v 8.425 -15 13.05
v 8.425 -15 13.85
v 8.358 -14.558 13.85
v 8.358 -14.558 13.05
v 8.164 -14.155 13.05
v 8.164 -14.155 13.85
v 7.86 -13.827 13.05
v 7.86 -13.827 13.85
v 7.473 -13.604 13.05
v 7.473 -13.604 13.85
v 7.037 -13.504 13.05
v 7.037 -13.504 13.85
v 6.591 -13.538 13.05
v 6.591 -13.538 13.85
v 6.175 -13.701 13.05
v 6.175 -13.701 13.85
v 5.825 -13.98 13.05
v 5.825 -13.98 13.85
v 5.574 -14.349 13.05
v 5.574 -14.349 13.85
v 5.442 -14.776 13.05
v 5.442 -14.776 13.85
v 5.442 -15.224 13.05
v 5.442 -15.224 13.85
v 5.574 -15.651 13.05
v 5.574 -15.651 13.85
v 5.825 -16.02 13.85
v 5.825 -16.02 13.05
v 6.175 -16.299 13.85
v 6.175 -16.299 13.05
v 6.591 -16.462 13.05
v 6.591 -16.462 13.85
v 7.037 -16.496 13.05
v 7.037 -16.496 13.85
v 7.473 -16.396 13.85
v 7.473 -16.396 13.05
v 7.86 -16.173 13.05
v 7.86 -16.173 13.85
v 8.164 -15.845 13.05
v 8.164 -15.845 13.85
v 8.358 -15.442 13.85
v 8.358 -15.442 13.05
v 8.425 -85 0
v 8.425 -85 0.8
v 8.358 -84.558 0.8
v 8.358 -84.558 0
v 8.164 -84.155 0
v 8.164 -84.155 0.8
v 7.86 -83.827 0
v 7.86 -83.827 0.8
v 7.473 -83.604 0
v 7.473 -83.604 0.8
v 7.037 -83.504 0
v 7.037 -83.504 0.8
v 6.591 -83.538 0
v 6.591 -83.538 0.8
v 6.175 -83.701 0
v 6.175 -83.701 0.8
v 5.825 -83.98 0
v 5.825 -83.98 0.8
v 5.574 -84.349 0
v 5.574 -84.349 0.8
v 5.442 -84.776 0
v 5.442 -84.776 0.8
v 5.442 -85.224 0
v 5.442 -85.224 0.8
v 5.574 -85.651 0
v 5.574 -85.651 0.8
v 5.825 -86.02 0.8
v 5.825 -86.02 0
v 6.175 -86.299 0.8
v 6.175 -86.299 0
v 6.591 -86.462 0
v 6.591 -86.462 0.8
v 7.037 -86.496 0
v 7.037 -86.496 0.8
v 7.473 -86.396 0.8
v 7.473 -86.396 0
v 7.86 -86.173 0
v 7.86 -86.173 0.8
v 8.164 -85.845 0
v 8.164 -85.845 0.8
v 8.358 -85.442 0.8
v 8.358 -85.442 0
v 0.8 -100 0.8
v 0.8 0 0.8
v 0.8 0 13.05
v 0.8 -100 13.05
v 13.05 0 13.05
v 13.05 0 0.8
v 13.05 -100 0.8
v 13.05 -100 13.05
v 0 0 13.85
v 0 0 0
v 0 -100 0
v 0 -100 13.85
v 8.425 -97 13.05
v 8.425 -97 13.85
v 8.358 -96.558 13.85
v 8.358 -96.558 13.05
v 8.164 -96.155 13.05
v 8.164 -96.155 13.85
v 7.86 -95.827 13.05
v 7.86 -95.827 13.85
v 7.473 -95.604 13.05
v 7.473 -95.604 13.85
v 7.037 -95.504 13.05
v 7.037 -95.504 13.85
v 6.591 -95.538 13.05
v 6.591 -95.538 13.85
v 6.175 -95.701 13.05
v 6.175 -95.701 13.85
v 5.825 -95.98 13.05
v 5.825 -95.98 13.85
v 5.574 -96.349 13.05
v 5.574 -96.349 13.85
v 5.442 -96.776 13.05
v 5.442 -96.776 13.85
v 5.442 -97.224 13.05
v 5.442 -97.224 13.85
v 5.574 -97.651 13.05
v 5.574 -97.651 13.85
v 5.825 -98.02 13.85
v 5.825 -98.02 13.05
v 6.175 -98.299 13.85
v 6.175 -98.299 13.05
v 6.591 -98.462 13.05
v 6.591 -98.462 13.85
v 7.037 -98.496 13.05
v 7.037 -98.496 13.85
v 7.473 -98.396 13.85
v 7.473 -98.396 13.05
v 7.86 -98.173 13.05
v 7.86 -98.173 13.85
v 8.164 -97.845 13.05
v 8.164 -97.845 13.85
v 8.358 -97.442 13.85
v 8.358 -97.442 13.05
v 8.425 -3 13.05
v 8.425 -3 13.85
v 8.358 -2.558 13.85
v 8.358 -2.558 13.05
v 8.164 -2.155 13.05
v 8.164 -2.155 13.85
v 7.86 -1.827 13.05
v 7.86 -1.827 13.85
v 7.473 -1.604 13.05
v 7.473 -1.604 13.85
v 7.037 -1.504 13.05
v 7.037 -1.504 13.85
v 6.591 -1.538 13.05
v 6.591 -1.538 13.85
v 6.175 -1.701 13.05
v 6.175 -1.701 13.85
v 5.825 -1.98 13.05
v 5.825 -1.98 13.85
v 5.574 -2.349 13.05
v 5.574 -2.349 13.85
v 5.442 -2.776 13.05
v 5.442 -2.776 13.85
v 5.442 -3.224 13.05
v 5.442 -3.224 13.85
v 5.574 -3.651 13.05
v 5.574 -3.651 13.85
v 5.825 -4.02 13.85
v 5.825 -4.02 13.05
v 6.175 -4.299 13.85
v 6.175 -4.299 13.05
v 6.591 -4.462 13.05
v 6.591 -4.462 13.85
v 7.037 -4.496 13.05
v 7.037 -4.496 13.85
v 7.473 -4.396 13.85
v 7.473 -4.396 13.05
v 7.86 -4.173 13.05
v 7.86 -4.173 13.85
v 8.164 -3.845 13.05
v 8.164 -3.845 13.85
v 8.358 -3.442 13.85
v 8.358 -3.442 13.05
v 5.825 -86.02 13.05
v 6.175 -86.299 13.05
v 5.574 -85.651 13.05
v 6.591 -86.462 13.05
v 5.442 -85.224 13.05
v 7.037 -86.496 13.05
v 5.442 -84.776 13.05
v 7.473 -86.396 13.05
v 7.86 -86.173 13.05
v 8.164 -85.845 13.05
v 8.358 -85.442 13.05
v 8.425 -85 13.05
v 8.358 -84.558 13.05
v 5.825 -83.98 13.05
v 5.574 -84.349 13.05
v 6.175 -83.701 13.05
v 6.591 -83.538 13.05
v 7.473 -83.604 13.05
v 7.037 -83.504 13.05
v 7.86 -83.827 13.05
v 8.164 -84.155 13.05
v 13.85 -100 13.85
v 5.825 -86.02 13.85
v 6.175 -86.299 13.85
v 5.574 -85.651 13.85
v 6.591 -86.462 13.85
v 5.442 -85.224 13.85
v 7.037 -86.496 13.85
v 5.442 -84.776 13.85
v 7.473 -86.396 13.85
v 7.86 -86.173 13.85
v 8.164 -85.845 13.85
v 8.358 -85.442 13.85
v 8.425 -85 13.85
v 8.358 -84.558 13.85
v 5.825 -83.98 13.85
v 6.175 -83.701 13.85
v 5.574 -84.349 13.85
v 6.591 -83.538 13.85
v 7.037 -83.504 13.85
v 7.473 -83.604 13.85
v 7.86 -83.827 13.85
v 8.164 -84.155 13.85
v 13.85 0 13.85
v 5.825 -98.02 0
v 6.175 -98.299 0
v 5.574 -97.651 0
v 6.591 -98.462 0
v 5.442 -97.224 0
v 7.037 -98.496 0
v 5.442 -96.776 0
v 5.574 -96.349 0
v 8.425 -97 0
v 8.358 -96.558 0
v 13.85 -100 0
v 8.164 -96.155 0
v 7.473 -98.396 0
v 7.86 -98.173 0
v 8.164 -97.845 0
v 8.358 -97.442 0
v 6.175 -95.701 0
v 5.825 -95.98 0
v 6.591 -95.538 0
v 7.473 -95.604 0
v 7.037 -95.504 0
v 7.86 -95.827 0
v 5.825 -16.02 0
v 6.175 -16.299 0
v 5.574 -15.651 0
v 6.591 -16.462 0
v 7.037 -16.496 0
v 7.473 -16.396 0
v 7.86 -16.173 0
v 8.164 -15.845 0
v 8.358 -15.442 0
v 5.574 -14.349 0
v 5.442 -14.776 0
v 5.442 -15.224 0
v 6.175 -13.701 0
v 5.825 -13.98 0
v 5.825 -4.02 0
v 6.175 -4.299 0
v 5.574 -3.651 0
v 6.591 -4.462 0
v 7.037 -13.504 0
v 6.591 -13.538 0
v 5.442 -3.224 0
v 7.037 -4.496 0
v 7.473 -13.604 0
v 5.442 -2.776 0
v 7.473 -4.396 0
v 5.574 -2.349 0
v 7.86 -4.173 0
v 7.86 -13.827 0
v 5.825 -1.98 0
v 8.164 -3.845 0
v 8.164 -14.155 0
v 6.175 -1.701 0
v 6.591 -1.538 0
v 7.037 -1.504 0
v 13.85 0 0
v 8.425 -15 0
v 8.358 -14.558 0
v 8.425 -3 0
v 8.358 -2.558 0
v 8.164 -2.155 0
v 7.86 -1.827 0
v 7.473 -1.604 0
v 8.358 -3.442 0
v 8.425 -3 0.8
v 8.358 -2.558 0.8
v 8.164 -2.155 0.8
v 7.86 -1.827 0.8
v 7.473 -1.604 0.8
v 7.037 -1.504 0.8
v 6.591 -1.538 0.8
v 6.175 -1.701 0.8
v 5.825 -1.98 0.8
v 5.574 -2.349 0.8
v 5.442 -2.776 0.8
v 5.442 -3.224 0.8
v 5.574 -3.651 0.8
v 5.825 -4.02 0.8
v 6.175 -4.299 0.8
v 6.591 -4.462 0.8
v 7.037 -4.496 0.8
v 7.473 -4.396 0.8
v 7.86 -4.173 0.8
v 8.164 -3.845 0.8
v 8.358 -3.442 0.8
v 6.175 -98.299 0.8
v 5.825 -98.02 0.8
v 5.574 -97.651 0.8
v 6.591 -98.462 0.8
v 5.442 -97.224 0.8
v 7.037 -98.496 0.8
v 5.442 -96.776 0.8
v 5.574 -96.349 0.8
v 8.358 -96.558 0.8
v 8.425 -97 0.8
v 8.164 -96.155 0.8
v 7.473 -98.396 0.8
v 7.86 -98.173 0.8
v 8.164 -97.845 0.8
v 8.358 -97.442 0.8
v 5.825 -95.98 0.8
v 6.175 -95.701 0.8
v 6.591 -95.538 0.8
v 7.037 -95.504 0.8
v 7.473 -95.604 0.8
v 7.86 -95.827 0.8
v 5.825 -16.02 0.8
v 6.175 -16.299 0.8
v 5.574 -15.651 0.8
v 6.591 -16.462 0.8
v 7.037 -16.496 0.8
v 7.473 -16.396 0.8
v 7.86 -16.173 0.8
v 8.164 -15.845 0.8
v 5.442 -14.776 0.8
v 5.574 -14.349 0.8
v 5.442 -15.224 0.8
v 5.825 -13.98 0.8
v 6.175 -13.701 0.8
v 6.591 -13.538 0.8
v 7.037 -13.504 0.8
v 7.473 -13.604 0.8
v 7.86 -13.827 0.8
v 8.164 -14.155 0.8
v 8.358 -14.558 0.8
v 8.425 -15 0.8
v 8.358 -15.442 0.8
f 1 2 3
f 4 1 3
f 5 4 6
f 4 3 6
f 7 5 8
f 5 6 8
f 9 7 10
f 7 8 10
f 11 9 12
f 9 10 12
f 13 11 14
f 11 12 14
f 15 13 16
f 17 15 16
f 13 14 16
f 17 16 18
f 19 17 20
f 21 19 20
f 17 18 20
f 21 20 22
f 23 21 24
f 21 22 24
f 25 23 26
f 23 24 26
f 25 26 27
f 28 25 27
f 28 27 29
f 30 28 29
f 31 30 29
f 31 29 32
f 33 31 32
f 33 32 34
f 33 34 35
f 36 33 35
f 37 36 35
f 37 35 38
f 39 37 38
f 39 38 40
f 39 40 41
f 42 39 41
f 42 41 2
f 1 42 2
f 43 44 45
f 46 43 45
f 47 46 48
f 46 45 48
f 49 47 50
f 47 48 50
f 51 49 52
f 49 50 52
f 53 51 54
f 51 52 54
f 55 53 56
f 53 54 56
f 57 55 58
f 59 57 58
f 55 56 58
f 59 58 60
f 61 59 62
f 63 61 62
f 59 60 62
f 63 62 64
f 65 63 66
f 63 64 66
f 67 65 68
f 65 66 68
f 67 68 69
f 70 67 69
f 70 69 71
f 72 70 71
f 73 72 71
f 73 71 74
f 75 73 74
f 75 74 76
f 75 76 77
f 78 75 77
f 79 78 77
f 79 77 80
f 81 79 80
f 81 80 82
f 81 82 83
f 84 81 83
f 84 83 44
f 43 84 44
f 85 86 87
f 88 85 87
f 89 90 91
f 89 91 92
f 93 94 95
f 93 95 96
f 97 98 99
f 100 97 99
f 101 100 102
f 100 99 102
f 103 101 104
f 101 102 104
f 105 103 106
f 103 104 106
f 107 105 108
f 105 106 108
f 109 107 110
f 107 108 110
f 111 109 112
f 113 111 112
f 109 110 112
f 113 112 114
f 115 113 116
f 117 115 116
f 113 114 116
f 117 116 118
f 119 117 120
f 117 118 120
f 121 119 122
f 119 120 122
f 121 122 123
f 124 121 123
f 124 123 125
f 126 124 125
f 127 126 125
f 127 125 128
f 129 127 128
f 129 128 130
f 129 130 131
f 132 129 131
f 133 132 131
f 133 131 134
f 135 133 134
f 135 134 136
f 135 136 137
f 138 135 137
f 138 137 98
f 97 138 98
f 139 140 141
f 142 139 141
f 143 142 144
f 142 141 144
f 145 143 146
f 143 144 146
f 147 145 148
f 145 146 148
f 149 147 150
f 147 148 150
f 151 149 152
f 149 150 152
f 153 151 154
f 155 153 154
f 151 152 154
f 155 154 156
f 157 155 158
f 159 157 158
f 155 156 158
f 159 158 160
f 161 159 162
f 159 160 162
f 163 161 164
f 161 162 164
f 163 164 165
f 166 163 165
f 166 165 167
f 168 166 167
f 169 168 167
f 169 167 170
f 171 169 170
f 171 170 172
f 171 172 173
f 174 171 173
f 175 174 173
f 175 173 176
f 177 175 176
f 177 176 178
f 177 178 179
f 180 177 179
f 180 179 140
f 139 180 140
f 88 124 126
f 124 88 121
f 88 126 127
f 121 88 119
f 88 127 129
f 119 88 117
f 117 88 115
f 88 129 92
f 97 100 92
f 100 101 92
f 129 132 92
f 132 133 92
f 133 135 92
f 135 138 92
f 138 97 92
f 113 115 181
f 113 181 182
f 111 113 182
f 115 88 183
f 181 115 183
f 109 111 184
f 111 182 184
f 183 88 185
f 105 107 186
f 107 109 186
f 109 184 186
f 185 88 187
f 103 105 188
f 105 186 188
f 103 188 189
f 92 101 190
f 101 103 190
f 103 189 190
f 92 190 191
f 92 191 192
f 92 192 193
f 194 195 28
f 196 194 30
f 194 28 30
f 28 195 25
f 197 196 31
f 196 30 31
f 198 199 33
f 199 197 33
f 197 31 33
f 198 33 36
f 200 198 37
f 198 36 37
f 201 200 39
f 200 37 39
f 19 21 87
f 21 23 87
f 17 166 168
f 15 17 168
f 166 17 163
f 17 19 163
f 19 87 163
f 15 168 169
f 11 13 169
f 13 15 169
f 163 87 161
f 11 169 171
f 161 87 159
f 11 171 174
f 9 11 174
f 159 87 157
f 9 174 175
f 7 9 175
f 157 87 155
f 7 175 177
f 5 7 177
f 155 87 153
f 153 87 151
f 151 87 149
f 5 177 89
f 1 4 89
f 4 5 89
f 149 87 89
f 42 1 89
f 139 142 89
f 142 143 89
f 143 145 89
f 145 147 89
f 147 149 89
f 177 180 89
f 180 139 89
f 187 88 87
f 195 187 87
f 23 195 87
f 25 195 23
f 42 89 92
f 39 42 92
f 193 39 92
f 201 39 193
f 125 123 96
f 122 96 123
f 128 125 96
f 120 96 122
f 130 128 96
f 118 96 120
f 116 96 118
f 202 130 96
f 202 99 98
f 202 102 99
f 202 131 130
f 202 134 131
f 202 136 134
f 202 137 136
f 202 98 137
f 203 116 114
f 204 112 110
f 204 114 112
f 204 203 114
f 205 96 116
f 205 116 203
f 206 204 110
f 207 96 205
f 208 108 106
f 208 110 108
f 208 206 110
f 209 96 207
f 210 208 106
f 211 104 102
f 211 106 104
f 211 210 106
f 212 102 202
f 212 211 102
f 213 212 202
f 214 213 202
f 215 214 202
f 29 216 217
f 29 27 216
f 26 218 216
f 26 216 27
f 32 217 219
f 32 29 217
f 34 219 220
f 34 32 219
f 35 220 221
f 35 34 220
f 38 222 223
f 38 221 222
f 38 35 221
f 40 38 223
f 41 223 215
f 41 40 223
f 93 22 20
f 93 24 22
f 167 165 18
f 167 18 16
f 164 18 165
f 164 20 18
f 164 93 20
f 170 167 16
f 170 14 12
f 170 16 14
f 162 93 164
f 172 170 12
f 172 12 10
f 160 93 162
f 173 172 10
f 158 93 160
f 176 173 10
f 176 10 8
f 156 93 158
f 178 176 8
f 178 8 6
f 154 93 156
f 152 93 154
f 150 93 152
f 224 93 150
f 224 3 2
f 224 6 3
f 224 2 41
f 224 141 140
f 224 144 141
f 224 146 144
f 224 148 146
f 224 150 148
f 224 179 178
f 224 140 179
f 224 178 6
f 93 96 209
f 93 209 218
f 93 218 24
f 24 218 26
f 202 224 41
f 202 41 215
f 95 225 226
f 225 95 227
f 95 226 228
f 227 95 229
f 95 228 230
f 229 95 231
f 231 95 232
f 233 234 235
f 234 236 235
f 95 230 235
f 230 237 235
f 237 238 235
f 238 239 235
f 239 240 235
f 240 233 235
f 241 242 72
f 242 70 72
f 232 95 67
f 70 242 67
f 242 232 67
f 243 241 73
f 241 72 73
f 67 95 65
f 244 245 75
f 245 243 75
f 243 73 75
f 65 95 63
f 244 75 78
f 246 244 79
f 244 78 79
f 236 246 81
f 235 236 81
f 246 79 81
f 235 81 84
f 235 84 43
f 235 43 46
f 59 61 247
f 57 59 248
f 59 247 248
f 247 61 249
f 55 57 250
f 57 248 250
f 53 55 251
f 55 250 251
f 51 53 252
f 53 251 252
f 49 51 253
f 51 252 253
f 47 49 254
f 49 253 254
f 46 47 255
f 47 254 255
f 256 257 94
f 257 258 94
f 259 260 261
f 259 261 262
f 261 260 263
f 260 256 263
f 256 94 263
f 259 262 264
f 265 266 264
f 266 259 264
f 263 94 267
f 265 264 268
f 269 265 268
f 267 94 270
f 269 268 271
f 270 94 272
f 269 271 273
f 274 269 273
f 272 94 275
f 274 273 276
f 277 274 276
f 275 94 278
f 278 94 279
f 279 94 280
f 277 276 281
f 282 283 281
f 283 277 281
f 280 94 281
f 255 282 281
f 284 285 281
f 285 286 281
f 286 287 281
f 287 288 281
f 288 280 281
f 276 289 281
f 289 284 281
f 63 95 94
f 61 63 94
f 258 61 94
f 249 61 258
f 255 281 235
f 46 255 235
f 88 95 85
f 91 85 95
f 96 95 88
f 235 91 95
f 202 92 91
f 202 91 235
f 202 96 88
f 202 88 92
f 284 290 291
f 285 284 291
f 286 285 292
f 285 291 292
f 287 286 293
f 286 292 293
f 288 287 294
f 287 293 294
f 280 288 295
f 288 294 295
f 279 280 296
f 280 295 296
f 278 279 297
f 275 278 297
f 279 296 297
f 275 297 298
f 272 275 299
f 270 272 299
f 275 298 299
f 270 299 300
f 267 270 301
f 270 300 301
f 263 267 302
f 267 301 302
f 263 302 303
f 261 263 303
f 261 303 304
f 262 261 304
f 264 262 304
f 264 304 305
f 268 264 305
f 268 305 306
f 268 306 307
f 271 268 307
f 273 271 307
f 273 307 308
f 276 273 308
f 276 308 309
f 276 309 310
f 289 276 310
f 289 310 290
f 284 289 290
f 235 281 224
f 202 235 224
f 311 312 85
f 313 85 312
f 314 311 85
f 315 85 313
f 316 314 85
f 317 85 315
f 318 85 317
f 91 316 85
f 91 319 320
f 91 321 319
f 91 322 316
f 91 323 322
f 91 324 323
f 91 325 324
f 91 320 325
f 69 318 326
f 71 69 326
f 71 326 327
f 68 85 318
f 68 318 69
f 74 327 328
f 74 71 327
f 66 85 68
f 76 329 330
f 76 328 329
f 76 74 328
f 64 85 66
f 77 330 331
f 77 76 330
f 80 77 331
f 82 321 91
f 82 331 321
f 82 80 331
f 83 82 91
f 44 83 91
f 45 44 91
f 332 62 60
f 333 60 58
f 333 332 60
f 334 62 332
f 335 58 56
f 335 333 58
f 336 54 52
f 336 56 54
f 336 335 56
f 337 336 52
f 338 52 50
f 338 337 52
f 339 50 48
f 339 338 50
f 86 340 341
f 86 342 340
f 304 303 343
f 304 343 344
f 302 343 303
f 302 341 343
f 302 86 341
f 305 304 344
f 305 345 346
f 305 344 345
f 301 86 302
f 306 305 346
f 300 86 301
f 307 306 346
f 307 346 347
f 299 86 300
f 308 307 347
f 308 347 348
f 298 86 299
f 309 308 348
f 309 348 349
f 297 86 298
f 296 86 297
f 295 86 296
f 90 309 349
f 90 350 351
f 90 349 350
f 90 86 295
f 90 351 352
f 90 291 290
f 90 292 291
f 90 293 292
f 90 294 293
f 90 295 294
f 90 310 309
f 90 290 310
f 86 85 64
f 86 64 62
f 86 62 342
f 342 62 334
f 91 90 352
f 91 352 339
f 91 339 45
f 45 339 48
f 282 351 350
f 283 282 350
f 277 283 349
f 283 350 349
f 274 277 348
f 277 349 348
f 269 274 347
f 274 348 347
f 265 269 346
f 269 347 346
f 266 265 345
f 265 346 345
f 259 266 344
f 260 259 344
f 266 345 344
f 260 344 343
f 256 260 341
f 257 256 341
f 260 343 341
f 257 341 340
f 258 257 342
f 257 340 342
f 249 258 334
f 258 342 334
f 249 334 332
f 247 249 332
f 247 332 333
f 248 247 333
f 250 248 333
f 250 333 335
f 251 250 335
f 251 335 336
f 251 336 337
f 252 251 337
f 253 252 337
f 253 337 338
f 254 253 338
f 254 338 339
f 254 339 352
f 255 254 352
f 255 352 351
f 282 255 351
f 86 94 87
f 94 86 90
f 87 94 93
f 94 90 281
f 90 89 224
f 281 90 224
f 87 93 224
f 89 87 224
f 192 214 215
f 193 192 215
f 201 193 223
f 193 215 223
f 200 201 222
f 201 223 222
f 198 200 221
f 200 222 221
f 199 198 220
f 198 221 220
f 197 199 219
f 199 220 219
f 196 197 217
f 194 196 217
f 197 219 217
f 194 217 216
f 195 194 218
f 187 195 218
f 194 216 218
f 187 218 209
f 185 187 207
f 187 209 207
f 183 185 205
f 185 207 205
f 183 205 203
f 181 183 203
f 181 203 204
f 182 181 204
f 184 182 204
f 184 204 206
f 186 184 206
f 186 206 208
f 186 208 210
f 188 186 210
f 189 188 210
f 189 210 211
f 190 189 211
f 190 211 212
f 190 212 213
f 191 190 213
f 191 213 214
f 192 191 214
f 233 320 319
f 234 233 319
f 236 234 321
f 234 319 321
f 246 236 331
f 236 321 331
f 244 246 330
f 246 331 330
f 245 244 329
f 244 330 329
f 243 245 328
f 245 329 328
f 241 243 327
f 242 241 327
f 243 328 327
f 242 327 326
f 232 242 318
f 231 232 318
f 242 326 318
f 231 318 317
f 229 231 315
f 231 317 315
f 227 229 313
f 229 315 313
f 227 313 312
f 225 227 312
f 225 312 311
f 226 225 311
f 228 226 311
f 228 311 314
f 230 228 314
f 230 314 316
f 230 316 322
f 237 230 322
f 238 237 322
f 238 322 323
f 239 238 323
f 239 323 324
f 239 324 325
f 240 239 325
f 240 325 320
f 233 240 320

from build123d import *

# Parameters (mm, degrees)
F0_W     = 13.85
F0_H     = 13.85
F1_DEPTH = 100
F2_T     = -0.8
F3_R     = 1.5
F4_DEPTH = 25


with BuildPart() as f1:
    # F0 (on Front) → F1 (new body)
    with BuildSketch(Plane.XZ):
        with Locations((6.925, 6.925)):
            Rectangle(F0_W, F0_H)
    extrude(amount=F1_DEPTH)

    # F2
    f2_openings = [f1.faces().sort_by_distance(p)[0] for p in [
        (6.925, -100, 6.925),
        (6.925, 0, 6.925),
    ]]
    offset(amount=F2_T, openings=f2_openings)

    # F3 (on face) → F4 (cut)
    with BuildSketch(Plane.XY.offset(13.85)):
        with Locations((6.925, -97)):
            Circle(F3_R)
        with Locations((6.925, -85)):
            Circle(F3_R)
        with Locations((6.925, -15)):
            Circle(F3_R)
        with Locations((6.925, -3)):
            Circle(F3_R)
    extrude(amount=-F4_DEPTH, mode=Mode.SUBTRACT)


solid = f1.part
